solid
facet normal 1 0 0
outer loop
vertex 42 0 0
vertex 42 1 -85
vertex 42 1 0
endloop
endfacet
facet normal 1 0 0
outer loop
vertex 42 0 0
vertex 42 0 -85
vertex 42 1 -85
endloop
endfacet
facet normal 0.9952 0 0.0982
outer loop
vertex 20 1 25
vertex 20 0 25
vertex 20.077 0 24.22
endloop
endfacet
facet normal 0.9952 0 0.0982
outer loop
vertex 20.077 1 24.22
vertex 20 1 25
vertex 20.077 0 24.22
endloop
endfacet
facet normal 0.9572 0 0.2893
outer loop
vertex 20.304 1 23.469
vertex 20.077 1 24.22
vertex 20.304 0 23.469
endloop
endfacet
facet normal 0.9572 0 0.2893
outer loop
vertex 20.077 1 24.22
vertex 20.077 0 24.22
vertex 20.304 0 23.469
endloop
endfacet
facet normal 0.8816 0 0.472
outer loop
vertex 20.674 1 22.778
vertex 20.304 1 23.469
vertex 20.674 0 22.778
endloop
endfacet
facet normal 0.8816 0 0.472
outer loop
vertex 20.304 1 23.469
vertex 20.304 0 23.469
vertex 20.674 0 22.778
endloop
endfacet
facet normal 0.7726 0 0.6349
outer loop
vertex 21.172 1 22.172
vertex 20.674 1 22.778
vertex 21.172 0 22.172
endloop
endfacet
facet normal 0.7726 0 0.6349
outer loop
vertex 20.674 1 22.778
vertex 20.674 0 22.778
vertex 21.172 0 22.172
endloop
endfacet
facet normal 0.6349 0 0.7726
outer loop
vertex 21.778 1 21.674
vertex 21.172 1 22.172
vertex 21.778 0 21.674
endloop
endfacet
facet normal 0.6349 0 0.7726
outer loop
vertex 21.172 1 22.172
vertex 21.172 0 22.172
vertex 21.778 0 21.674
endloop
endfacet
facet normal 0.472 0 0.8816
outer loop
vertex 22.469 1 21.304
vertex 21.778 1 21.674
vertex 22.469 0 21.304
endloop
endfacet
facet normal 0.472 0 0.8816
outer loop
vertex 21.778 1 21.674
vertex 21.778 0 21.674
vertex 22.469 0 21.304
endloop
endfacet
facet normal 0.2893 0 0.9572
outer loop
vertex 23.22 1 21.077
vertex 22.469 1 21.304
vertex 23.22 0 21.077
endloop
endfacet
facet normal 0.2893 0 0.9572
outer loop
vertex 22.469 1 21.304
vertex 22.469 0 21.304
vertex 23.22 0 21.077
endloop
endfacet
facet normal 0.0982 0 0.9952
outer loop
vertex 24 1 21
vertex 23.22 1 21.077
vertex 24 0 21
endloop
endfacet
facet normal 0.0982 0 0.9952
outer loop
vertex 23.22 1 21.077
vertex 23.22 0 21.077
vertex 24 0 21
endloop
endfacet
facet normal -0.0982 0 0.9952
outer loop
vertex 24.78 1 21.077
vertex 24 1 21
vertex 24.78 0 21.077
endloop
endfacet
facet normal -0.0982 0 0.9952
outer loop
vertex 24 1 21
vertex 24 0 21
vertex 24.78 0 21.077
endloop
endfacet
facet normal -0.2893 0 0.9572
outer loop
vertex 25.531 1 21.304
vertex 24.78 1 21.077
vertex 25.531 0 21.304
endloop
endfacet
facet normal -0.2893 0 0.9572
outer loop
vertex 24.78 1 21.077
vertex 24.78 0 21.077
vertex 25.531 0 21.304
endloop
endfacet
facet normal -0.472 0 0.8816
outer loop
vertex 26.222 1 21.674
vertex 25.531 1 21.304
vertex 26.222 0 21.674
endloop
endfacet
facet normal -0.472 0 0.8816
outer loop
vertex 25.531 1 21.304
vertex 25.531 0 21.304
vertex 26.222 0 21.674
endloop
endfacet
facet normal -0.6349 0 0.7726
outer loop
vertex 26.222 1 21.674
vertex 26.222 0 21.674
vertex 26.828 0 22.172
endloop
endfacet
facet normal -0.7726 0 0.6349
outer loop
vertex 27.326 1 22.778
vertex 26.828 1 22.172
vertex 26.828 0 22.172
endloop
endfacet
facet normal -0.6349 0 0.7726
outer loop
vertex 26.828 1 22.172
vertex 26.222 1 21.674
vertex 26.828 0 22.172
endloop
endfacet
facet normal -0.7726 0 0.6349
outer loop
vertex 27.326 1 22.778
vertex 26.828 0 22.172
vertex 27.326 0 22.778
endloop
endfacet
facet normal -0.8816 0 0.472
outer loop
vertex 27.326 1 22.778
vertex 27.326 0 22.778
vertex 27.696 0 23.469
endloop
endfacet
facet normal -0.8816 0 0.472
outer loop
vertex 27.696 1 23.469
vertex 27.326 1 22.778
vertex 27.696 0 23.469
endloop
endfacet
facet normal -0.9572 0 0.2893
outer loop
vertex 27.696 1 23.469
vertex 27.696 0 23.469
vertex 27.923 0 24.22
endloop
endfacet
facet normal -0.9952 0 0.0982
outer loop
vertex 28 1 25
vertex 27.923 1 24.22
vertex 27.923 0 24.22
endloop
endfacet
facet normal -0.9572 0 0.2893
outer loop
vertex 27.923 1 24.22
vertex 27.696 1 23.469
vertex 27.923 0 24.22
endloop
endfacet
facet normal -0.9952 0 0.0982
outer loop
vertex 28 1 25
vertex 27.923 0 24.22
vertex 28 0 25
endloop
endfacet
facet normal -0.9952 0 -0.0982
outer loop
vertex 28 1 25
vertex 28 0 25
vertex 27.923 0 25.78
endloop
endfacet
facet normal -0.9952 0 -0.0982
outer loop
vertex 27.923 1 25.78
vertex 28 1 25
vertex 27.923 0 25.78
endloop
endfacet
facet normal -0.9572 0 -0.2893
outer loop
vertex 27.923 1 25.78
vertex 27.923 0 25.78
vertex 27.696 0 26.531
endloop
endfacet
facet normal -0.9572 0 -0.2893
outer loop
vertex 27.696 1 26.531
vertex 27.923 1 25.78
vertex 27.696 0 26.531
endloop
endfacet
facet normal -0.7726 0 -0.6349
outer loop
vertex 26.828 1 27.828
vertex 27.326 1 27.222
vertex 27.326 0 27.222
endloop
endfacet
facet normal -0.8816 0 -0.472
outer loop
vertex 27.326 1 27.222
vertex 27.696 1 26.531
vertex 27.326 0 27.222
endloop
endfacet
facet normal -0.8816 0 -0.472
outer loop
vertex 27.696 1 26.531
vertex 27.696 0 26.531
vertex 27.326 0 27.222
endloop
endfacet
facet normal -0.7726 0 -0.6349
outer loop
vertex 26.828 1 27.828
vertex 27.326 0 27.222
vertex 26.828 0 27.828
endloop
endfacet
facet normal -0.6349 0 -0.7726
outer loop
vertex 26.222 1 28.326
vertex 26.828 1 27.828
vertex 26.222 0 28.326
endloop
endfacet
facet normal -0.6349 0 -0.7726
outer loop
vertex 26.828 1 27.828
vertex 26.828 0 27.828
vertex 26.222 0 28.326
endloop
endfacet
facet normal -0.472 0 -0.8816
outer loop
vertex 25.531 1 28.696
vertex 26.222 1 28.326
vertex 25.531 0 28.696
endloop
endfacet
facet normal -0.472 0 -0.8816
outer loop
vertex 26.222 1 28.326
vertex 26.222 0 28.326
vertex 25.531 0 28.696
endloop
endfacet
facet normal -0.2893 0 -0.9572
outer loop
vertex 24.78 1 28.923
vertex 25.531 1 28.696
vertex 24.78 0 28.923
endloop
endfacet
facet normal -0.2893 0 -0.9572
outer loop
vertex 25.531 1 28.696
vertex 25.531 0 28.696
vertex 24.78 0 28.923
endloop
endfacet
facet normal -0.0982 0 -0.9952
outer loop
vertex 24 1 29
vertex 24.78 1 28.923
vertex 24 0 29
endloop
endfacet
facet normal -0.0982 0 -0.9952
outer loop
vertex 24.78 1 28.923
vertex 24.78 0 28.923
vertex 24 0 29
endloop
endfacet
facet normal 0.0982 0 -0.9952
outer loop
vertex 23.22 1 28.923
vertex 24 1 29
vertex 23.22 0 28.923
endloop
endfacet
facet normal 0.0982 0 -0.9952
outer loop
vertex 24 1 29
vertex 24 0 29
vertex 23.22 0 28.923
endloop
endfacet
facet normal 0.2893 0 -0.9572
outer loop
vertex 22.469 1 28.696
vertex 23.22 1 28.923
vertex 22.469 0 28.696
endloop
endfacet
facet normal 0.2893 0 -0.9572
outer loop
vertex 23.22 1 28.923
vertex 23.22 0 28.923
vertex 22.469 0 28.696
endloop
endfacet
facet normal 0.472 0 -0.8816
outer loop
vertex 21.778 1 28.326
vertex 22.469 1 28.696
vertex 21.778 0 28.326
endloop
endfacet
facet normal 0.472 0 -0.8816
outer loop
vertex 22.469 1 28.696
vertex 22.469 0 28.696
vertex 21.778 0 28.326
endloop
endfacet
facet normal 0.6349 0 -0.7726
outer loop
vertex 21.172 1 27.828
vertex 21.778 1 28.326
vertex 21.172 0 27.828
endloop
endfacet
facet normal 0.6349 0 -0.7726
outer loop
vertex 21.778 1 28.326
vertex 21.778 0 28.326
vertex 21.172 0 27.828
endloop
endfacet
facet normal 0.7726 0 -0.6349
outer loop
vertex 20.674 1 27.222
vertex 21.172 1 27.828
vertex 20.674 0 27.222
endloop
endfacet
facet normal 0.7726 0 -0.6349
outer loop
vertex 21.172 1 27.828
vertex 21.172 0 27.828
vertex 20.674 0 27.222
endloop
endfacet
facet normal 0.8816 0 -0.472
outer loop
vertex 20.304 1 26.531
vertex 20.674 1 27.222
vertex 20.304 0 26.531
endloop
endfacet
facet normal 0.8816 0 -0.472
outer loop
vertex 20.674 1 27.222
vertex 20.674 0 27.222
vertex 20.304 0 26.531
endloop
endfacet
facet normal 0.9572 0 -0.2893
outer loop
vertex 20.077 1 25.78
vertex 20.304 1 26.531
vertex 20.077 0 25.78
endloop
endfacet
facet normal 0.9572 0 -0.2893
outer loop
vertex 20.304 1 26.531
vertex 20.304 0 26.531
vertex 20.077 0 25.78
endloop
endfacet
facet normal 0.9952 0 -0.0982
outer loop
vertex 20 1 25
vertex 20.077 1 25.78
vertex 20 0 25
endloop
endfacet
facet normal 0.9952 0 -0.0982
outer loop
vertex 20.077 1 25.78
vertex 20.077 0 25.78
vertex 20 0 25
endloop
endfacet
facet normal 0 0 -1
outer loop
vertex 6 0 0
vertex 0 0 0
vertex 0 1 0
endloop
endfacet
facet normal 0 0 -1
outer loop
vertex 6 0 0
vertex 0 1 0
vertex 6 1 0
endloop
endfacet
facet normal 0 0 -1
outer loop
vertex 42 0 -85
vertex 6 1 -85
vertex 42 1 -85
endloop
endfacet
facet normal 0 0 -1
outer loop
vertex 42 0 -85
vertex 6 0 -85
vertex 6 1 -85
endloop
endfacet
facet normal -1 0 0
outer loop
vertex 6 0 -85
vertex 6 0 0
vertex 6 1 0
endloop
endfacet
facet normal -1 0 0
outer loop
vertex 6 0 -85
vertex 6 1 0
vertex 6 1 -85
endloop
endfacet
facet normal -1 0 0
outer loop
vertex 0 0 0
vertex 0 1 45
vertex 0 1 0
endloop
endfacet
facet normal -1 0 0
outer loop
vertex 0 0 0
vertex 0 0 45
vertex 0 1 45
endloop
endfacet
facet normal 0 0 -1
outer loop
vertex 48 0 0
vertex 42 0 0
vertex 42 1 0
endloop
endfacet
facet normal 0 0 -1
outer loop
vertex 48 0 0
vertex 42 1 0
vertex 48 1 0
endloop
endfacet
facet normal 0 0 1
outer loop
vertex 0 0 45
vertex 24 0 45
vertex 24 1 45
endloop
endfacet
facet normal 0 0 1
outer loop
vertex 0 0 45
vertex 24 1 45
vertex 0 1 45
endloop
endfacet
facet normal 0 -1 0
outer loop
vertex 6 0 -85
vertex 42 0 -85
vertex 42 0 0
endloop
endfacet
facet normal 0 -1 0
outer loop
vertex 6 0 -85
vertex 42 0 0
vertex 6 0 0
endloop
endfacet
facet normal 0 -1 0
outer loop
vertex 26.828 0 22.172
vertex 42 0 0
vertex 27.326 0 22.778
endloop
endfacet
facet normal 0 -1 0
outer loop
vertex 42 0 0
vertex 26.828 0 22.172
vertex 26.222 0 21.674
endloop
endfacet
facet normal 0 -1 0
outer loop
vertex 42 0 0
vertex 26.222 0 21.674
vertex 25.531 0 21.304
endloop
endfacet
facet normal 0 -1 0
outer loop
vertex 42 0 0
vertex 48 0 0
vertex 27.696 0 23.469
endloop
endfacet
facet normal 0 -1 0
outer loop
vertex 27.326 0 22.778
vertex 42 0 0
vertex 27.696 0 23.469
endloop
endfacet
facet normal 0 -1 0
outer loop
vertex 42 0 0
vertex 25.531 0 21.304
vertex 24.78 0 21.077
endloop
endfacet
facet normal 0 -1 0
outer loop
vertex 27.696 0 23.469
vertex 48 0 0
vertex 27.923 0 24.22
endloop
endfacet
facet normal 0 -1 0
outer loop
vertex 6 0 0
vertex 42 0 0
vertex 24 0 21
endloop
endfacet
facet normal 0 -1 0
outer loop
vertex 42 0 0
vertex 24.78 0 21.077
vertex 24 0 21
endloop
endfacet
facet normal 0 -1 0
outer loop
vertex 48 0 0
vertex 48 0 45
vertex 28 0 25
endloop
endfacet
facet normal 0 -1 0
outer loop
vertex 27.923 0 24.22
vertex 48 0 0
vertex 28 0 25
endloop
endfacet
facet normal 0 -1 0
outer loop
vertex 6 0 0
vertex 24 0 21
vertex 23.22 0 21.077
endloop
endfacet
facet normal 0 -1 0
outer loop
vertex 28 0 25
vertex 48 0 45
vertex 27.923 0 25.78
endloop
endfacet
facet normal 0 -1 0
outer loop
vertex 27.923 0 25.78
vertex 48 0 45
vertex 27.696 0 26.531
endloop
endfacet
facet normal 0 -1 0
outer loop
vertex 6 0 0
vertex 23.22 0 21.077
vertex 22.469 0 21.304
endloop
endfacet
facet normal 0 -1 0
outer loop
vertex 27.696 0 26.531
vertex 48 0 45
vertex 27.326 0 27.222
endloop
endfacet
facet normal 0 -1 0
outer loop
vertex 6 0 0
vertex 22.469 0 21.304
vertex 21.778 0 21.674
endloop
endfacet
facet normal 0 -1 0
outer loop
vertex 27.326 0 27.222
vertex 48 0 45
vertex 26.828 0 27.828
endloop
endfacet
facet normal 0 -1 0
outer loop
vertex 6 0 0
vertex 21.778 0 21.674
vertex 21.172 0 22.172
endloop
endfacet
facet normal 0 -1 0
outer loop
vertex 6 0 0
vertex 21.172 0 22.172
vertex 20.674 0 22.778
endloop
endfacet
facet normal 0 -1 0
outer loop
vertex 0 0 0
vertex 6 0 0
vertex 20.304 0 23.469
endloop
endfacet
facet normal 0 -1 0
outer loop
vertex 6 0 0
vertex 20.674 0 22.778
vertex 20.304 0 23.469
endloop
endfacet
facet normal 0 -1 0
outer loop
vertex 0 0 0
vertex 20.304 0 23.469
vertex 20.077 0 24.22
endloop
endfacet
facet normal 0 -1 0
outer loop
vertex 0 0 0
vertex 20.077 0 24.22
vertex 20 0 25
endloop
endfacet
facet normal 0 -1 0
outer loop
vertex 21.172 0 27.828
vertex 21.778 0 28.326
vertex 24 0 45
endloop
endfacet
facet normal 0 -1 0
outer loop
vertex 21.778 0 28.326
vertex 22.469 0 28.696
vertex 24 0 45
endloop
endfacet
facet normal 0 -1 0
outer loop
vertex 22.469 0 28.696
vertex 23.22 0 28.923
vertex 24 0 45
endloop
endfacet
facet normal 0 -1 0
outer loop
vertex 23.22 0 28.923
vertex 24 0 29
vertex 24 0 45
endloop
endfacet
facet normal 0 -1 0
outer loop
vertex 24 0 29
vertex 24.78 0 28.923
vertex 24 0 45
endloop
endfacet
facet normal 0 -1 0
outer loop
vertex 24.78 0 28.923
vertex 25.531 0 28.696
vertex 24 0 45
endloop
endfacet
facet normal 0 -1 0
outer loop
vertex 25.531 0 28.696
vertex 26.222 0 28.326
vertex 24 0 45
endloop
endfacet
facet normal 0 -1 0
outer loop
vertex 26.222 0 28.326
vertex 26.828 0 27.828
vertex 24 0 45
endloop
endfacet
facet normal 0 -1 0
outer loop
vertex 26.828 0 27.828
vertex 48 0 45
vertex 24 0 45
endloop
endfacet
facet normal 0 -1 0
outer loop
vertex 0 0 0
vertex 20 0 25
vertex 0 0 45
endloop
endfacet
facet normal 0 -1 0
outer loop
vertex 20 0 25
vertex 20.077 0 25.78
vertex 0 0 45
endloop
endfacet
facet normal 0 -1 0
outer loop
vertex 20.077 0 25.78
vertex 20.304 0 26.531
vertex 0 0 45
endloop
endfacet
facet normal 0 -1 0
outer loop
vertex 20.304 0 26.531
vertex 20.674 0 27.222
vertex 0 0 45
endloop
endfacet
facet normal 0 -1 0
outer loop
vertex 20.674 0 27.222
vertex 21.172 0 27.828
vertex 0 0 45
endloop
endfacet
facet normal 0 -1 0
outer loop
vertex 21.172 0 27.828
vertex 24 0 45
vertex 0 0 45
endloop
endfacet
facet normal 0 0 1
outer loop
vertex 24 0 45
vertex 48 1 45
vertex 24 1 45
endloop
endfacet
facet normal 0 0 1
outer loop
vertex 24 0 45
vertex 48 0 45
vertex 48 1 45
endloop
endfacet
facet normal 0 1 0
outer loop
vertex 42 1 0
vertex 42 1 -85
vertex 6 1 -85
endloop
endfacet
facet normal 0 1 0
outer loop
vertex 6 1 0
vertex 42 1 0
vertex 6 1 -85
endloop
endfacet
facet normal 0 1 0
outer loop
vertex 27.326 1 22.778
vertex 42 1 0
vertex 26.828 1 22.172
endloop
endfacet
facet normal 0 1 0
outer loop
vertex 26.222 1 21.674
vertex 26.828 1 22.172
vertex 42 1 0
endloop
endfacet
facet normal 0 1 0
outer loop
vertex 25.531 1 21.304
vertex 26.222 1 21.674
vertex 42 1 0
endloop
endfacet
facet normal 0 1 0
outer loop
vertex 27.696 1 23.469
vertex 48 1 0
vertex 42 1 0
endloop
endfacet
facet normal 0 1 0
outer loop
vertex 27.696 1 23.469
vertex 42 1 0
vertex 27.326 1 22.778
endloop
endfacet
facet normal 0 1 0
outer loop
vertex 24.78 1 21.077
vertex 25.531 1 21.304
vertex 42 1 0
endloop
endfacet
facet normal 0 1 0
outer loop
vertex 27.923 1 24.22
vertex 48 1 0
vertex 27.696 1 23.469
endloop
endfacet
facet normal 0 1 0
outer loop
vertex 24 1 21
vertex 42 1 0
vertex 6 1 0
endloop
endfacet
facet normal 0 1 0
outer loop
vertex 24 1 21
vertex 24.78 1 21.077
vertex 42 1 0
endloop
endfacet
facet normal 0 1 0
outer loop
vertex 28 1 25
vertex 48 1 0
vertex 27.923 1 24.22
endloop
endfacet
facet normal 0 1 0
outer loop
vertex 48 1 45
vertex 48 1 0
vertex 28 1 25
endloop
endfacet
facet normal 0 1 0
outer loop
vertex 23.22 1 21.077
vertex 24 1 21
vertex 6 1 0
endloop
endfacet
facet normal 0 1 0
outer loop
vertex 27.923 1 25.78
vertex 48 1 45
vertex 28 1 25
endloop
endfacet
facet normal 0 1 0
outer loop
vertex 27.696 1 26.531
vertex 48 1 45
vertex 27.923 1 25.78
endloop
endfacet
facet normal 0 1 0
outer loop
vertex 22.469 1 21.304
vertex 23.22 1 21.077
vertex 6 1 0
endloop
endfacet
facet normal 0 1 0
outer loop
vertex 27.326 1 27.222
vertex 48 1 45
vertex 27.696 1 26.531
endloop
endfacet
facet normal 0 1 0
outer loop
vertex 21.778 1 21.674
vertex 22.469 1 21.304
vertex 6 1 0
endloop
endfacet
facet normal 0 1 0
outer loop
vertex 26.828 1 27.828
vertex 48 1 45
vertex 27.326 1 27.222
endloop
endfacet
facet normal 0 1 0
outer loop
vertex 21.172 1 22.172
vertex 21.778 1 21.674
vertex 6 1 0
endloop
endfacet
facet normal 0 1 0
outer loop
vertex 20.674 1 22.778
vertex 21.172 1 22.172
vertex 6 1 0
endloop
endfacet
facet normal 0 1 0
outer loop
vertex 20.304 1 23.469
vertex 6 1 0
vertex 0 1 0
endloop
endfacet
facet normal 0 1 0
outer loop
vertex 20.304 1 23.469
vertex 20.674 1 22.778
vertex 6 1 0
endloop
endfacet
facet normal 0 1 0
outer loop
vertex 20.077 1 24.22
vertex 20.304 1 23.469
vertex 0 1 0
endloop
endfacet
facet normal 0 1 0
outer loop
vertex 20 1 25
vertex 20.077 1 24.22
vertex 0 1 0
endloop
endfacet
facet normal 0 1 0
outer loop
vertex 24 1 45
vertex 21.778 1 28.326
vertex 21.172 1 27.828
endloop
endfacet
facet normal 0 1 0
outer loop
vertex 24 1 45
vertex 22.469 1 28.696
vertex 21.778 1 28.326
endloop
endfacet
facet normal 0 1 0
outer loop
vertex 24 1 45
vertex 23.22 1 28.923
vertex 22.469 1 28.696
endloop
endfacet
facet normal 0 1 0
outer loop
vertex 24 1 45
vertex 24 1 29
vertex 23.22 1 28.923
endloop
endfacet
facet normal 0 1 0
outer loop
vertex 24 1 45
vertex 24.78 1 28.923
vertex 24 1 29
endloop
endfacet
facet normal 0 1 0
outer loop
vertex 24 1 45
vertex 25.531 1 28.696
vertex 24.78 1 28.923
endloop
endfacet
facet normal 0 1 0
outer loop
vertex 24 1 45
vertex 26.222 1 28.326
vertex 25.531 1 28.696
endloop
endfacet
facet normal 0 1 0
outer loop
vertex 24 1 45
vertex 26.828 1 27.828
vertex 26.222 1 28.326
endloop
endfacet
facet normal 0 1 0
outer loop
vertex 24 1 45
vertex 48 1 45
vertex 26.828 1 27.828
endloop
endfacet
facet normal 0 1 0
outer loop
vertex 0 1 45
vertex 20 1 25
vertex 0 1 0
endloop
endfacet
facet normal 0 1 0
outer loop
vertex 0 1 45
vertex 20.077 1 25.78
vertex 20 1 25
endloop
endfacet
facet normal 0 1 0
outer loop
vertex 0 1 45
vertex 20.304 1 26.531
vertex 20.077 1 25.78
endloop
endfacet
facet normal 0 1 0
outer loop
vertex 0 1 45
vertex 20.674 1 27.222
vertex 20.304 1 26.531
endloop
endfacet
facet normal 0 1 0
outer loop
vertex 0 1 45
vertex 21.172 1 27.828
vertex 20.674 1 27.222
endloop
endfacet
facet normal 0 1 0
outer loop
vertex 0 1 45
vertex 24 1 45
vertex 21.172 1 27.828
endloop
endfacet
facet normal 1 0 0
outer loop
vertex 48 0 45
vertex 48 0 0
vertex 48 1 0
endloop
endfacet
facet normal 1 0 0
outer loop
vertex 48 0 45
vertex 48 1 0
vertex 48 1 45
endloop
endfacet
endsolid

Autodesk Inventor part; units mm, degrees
ref_plane "YZ Plane" through (0, 0, 0) normal (1, 0, 0) x (0, 1, 0)
ref_plane "XZ Plane" through (0, 0, 0) normal (0, 1, 0) x (-1, 0, 0)
ref_plane "XY Plane" through (0, 0, 0) normal (0, 0, 1) x (1, 0, 0)
sketch "Sketch1" plane through (0, 0, 0) normal (0, 1, 0) x (-1, 0, 0)
  line L0 (-48, 0) -> (-48, 45)
  line L1 (-48, 45) -> (0, 45)
  line L2 (0, 45) -> (0, 0)
  line L3 (-6, 0) -> (-6, -85)
  line L4 (-6, -85) -> (-42, -85)
  line L5 (-42, -85) -> (-42, 0)
  line L6 (-24, 45) -> (-24, 29)
  circle A0 centre (-24, 25) radius 4
  line L7 (0, 0) -> (-6, 0)
  line L8 (-42, 0) -> (-48, 0)
  dimension "d8" = 8
  dimension "d0" = 48
  dimension "d1" = 45
  dimension "d2" = 36
  dimension "d3" = 85
  dimension "d6" = 16
  dimension "d7" = 6
extrude "Extrusion1" add sketch "Sketch1" along normal blind 1
properties part number "PendulumBackplate"
